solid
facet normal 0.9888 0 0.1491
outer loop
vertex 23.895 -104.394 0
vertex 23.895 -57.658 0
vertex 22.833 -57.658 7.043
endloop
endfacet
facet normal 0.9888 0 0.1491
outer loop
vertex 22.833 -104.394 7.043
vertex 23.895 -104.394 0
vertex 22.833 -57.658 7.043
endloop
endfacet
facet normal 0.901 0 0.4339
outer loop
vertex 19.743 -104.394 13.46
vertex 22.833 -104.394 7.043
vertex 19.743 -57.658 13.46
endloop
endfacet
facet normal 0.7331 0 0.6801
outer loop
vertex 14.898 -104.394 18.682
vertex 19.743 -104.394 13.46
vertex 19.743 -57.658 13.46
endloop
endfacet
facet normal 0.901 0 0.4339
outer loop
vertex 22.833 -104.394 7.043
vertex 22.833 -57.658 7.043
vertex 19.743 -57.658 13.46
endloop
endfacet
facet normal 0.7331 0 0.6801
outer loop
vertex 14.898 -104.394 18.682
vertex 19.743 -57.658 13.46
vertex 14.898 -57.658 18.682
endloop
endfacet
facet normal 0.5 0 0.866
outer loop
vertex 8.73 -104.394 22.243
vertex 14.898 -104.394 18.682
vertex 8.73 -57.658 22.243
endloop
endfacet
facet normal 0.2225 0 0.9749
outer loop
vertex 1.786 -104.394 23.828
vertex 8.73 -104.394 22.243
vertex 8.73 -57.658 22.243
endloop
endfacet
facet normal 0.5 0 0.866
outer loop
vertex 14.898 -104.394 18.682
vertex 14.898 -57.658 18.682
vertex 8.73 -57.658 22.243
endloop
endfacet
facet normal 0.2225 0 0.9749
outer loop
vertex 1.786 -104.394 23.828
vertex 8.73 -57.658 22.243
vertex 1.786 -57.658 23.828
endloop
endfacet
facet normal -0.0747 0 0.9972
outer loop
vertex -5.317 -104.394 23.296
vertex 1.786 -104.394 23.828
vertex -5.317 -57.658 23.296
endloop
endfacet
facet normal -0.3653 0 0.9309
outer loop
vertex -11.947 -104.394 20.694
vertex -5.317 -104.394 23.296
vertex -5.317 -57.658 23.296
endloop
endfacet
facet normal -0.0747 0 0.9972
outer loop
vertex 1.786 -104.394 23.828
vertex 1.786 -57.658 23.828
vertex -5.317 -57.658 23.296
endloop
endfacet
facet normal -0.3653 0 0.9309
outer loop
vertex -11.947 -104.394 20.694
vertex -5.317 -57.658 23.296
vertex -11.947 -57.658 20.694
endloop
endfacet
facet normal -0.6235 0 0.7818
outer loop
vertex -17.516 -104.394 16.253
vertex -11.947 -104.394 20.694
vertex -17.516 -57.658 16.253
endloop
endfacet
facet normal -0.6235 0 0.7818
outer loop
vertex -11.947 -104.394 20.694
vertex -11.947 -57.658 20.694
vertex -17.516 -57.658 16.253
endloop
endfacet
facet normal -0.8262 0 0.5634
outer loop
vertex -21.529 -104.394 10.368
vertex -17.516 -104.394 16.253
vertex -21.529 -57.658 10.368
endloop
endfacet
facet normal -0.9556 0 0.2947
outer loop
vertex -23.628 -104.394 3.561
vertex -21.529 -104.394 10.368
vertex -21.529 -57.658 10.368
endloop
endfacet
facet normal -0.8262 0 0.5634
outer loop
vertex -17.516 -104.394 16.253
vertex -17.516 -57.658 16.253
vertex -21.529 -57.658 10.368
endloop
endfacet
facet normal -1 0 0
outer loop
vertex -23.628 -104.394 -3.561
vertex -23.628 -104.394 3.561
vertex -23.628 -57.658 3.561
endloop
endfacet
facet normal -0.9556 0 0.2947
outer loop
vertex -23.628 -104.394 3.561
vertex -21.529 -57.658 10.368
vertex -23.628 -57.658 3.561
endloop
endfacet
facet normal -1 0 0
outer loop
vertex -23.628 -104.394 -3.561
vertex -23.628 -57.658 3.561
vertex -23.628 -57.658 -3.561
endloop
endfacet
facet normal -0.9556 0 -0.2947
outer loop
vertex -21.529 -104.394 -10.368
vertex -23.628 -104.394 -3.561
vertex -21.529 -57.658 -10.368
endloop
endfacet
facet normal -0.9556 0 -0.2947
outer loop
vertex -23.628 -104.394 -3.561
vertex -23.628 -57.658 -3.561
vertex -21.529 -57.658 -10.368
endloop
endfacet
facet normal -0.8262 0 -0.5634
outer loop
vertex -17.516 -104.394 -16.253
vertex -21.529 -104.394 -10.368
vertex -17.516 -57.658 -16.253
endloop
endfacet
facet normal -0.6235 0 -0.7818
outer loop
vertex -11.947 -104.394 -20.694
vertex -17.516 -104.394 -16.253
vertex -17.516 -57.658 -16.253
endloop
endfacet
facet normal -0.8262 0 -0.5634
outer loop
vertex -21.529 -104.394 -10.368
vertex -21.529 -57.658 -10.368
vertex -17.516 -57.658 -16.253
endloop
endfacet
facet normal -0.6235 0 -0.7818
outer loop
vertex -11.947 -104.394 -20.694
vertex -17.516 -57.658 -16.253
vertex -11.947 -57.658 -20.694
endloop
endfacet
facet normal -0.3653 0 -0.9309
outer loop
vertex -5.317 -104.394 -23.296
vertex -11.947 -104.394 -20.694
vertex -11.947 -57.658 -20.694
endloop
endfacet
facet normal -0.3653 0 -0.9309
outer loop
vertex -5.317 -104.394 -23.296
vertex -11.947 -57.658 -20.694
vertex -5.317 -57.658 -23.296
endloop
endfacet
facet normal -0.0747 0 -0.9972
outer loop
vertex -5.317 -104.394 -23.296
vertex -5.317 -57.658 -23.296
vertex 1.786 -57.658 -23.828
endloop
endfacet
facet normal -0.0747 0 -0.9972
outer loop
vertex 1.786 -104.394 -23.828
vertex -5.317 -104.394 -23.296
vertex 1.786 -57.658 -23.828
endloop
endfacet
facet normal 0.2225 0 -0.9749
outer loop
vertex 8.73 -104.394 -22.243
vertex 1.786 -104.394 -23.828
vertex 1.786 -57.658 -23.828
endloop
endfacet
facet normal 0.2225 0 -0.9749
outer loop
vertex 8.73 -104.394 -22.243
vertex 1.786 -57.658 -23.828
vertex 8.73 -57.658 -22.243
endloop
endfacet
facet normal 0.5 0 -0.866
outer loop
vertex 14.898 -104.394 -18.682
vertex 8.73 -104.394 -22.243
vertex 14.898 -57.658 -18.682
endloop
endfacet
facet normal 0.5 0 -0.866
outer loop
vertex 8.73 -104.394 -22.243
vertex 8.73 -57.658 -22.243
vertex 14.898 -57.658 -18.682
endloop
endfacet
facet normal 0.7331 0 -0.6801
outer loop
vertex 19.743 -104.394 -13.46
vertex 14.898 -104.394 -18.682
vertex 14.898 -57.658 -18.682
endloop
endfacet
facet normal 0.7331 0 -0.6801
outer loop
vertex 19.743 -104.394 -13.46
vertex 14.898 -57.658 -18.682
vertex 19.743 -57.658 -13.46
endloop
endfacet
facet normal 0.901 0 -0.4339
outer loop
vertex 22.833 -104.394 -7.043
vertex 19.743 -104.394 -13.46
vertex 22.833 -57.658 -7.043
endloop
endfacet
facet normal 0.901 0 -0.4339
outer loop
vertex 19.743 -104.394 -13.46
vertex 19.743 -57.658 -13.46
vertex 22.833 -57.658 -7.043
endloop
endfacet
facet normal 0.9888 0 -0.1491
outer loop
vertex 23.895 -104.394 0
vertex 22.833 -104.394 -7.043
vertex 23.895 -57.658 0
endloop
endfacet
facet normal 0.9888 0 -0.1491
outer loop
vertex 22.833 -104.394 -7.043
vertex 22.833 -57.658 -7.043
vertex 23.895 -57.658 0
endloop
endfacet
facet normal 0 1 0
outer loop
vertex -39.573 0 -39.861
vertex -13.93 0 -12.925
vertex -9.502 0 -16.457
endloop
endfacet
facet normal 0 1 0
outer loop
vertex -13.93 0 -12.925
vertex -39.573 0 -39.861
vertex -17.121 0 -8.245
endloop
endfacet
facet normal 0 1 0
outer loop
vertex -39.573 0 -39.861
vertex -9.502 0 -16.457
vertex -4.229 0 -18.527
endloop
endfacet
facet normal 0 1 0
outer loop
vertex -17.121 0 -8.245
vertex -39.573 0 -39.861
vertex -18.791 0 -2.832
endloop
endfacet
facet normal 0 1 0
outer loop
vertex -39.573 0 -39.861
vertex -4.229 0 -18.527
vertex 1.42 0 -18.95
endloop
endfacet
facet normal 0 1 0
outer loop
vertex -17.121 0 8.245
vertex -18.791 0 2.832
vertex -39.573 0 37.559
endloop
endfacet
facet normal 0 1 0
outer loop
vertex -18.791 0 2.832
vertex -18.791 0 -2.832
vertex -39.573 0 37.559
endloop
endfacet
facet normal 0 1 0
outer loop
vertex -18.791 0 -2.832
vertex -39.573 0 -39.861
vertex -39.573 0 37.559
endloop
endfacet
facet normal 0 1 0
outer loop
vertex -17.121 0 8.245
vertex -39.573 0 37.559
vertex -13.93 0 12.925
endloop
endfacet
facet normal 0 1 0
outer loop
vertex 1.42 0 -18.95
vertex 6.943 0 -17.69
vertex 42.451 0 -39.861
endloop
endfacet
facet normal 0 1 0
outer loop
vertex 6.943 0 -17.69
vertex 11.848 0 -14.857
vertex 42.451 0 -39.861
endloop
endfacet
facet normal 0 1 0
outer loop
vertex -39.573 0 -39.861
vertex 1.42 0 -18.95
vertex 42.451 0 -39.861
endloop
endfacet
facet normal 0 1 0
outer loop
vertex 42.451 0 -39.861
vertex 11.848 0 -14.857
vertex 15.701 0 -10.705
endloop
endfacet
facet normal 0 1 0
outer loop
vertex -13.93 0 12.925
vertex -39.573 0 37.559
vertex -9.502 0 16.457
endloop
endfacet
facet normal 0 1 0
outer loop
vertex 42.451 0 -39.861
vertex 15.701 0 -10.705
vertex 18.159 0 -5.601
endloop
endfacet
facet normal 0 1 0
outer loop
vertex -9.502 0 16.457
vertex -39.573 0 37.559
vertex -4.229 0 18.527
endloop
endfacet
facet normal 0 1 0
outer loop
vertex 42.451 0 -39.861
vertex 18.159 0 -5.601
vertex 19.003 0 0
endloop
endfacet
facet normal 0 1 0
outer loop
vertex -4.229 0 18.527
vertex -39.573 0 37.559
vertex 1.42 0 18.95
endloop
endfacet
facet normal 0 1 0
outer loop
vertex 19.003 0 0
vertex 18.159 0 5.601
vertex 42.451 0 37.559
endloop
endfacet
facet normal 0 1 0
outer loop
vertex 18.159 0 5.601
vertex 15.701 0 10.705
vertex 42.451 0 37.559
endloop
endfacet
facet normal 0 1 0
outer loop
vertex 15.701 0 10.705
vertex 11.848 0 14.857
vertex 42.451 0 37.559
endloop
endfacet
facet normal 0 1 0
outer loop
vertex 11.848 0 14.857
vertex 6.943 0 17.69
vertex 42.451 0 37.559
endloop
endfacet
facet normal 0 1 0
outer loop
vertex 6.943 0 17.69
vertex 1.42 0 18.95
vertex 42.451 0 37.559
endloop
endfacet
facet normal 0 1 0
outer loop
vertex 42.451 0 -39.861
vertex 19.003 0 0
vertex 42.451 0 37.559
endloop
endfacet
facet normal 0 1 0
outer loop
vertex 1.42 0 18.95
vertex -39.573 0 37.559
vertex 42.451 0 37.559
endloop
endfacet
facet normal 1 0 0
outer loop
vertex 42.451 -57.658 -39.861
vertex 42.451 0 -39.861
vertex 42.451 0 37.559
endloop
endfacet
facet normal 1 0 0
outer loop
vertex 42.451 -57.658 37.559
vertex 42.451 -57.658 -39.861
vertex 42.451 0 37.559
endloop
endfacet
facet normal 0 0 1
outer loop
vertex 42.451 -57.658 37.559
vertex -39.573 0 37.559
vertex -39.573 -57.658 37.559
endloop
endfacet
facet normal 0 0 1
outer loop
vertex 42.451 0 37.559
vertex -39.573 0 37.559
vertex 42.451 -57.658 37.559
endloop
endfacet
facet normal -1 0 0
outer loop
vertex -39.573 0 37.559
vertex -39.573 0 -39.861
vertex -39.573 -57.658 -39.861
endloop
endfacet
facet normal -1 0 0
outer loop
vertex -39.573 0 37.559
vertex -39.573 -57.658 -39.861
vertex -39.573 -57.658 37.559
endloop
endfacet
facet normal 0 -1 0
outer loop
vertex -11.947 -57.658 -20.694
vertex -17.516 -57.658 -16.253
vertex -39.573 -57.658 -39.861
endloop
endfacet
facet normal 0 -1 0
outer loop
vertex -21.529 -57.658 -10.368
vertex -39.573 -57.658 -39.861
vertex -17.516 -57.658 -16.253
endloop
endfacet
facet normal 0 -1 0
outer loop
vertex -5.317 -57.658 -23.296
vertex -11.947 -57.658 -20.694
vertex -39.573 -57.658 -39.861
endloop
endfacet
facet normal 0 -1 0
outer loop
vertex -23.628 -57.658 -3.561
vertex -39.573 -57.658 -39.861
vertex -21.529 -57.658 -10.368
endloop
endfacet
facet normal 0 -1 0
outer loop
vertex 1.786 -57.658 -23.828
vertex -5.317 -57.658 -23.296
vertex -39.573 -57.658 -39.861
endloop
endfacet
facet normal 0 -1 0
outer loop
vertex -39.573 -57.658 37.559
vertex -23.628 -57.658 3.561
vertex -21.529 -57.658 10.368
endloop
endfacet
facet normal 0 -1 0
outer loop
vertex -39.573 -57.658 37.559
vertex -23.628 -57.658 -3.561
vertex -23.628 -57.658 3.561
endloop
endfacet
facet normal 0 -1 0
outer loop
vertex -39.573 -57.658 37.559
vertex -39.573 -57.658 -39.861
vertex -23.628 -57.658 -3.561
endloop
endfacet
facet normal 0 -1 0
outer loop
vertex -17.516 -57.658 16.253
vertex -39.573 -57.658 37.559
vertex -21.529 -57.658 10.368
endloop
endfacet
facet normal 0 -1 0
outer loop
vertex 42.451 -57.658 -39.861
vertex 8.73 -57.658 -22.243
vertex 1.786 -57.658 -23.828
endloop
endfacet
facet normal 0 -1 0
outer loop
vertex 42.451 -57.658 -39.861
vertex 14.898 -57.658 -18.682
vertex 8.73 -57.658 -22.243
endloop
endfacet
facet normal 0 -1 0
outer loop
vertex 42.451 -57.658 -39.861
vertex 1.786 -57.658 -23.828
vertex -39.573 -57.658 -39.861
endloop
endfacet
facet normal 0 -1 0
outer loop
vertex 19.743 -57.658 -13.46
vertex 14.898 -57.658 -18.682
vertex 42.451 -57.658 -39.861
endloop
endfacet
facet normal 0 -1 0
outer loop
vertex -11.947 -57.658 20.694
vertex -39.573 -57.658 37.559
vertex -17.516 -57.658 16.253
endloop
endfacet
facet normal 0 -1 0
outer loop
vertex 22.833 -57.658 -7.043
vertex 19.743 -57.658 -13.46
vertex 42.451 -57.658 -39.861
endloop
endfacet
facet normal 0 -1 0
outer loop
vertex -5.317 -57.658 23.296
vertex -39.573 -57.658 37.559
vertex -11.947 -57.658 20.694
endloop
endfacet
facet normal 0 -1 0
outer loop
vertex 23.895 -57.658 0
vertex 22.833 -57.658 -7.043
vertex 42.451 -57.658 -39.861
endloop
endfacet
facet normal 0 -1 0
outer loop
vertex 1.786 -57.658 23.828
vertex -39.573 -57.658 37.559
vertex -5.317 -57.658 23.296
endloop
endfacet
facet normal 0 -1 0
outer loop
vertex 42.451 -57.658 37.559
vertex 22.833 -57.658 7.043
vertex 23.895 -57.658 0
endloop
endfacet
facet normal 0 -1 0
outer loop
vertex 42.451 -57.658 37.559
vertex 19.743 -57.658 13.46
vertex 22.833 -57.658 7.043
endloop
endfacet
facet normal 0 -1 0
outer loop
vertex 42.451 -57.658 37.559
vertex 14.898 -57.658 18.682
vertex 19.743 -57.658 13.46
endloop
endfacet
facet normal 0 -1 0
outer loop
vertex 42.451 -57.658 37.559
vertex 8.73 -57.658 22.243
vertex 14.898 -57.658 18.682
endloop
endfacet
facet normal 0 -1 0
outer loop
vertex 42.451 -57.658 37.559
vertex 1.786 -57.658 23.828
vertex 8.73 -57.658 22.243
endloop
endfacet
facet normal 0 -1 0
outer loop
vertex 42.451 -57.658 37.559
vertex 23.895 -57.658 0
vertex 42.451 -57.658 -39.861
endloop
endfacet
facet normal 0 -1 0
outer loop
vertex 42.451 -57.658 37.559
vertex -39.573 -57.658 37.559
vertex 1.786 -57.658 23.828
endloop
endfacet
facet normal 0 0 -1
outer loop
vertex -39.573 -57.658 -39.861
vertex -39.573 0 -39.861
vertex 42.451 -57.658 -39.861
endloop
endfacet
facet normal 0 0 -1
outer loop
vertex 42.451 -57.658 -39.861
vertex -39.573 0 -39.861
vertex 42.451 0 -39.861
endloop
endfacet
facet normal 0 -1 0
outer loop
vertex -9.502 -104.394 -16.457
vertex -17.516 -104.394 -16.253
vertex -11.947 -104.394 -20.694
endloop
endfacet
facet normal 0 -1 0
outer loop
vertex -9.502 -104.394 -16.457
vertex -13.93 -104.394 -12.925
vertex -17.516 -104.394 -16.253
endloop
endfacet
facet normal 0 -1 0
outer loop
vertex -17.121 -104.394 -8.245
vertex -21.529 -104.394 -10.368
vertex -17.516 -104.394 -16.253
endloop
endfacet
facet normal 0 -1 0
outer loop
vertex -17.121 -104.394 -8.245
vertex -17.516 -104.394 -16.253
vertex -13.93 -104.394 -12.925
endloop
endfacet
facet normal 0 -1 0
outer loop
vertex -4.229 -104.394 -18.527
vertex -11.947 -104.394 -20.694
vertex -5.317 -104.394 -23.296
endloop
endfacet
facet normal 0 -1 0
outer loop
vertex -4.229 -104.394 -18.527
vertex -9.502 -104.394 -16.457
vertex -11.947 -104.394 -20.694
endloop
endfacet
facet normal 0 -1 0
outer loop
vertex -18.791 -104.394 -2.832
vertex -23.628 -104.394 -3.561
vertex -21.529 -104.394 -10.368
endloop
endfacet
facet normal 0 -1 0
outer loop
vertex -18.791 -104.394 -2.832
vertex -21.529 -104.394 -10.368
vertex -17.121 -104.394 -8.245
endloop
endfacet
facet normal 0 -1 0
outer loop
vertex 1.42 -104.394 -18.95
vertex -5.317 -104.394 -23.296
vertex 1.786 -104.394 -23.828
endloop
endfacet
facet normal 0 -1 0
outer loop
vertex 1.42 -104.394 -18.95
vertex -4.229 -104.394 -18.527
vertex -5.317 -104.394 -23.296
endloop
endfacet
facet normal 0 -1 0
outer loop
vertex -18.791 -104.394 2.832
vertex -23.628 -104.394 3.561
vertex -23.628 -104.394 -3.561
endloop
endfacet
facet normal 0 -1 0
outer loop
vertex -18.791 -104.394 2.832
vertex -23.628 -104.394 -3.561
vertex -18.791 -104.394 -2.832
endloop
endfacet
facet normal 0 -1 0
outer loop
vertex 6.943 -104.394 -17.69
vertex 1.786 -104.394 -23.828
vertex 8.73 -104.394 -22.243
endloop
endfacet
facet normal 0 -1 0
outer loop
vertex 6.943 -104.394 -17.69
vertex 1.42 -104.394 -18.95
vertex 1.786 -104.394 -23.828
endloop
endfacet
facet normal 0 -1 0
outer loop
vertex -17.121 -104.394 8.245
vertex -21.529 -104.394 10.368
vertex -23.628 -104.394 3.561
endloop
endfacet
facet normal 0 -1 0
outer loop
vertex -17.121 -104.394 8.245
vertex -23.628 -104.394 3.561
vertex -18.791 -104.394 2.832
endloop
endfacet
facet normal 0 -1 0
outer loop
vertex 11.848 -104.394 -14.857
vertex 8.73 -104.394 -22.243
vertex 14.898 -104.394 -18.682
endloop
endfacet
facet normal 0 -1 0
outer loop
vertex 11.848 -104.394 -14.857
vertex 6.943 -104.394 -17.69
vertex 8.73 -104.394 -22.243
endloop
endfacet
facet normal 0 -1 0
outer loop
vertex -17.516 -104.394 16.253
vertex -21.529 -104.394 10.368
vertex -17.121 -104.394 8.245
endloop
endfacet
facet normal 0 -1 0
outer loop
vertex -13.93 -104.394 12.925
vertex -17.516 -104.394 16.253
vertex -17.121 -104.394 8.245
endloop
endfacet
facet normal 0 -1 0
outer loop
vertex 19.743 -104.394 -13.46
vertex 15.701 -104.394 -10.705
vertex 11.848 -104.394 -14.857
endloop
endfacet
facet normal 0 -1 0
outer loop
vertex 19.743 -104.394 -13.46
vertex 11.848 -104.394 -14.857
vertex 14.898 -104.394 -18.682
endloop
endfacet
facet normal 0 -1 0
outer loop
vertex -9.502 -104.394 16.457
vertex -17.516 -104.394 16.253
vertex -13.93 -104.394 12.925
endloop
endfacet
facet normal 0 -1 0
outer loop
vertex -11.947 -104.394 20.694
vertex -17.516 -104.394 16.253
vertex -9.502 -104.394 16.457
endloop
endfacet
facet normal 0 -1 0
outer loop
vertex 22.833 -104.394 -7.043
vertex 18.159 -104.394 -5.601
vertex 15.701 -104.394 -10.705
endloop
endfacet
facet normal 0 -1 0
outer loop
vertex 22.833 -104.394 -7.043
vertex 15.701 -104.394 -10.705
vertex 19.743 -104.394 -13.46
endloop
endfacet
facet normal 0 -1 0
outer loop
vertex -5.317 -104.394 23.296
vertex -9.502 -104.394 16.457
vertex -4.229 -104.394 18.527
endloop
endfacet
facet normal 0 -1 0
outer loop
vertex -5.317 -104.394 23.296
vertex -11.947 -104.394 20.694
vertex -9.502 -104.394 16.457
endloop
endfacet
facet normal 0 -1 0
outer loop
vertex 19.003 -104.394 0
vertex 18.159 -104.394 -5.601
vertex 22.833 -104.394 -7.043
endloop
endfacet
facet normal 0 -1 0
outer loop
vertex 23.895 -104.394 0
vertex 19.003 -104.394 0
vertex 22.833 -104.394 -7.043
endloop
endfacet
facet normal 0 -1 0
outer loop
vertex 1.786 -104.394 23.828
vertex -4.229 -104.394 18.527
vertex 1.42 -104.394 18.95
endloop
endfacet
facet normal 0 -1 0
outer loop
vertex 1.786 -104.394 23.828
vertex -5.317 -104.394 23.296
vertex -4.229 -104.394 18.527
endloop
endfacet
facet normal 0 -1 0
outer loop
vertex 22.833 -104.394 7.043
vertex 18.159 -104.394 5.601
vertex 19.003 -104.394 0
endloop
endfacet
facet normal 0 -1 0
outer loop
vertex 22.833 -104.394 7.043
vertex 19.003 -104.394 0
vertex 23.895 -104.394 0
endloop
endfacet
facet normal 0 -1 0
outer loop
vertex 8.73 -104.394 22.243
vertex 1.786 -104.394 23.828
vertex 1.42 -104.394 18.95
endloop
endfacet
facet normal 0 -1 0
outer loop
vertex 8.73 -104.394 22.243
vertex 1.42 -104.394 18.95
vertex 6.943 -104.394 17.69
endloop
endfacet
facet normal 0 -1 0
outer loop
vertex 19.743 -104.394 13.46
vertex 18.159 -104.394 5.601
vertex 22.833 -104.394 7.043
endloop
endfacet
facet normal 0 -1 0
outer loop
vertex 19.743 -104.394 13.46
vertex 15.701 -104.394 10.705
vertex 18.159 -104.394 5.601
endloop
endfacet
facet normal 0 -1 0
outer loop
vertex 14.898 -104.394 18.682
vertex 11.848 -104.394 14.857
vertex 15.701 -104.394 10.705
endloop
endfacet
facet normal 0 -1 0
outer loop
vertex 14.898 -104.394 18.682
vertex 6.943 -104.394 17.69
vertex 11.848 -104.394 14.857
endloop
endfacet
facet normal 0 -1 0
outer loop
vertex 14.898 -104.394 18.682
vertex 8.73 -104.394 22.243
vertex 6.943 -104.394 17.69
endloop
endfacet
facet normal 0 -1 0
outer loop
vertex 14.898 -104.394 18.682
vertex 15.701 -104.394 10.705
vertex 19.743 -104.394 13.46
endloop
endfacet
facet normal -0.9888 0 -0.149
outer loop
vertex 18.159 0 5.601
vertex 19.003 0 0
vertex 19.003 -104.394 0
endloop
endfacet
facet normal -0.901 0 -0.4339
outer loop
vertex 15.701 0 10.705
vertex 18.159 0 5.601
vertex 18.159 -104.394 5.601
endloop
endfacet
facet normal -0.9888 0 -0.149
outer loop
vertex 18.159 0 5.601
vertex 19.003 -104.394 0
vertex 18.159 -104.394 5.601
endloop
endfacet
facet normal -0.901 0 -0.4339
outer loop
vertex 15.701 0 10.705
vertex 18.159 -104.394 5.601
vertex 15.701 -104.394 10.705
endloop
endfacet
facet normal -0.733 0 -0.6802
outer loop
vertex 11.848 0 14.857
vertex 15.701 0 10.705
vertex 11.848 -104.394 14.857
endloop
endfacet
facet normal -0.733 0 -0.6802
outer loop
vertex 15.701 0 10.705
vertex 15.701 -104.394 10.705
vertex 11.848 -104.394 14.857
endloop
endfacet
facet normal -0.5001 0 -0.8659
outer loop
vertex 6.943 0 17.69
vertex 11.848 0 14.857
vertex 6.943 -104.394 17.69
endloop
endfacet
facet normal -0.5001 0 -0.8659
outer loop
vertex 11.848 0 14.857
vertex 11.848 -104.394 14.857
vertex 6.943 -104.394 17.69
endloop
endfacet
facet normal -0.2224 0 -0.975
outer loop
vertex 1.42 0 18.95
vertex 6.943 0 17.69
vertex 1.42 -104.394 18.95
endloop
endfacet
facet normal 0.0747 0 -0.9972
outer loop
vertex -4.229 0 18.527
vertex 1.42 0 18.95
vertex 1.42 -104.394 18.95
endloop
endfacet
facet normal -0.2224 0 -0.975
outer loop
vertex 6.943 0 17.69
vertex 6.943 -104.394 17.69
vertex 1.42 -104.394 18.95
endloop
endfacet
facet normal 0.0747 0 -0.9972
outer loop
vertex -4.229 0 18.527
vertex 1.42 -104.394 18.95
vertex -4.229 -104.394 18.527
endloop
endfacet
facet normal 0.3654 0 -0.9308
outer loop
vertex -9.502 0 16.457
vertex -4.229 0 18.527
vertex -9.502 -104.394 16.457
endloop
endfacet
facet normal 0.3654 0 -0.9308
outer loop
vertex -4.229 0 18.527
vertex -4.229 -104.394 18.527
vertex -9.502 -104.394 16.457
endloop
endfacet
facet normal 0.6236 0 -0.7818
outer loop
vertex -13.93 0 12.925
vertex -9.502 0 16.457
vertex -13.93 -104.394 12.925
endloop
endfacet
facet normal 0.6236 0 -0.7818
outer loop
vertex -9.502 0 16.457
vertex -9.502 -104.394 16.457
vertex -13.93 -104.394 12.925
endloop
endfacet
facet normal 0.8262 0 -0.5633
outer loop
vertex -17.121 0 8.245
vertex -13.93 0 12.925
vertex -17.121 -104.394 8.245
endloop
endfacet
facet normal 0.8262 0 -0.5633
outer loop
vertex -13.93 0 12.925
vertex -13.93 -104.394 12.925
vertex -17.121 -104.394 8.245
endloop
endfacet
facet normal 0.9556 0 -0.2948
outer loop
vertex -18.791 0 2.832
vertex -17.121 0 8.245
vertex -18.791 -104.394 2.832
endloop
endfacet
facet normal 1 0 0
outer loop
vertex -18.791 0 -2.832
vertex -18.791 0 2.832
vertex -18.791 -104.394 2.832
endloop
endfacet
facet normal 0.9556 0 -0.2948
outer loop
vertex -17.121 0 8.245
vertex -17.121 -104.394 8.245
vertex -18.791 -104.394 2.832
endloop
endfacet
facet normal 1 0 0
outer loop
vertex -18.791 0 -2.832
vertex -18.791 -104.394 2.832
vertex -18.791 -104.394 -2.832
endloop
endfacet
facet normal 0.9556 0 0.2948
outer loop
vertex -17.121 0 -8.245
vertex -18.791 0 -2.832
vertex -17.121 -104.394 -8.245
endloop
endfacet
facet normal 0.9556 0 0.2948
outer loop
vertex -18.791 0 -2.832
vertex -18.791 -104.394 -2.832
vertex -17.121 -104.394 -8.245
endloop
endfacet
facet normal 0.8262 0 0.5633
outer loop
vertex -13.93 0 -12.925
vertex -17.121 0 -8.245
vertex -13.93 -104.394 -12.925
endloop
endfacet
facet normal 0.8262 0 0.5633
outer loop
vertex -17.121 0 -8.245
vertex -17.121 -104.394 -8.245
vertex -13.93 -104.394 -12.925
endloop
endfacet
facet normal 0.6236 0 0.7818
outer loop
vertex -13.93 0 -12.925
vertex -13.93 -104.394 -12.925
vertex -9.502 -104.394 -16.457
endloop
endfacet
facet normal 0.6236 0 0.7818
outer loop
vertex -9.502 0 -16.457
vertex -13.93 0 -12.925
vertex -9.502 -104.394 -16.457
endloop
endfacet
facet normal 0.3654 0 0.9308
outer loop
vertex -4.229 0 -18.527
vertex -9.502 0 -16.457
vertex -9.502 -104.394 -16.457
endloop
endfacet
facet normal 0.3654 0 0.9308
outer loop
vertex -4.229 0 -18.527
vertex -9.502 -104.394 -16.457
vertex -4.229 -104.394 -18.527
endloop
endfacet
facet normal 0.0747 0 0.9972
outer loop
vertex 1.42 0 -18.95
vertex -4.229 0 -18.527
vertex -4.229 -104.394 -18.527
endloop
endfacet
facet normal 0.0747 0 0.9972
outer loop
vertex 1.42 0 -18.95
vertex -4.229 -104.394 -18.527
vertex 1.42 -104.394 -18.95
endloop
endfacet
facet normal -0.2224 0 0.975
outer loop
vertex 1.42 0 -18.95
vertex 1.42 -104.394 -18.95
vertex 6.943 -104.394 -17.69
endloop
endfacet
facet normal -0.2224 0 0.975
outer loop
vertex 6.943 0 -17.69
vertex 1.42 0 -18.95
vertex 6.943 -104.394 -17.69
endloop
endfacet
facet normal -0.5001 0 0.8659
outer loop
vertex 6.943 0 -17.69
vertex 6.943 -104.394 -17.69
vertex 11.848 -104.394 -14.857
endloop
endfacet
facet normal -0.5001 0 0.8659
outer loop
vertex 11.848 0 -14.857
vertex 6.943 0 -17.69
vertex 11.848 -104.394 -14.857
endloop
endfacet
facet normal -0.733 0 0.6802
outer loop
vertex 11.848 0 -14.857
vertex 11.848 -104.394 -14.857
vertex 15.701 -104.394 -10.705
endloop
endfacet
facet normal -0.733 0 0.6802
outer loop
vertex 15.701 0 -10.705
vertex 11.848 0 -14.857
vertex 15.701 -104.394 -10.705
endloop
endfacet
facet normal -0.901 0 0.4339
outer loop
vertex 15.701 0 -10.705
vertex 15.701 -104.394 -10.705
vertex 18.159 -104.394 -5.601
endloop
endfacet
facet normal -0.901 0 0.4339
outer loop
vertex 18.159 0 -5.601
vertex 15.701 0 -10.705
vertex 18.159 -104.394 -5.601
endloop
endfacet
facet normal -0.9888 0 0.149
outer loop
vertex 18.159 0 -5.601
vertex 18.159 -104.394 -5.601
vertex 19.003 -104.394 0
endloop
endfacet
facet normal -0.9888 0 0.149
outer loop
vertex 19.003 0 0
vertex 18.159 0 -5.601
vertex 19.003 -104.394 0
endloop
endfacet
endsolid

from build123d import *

# Parameters (mm, degrees)
F0_W     = 82.024645
F0_H     = 77.41975
F1_DEPTH = 57.658
F2_R     = 23.894838
F3_DEPTH = 46.736
F4_R     = 19.003209
F5_DEPTH = 198.882


with BuildPart() as f1:
    # F0 (on Front) → F1 (new body)
    with BuildSketch(Plane.XZ):
        with Locations((1.43903, -1.151223)):
            Rectangle(F0_W, F0_H)
    extrude(amount=F1_DEPTH)

    # F2 (on face) → F3 (join)
    with BuildSketch(Plane.XZ.offset(57.658)):
        Circle(F2_R)
    extrude(amount=F3_DEPTH)

    # F4 (on face) → F5 (cut)
    with BuildSketch(Plane.XZ.offset(104.394)):
        Circle(F4_R)
    extrude(amount=-F5_DEPTH, mode=Mode.SUBTRACT)


solid = f1.part
